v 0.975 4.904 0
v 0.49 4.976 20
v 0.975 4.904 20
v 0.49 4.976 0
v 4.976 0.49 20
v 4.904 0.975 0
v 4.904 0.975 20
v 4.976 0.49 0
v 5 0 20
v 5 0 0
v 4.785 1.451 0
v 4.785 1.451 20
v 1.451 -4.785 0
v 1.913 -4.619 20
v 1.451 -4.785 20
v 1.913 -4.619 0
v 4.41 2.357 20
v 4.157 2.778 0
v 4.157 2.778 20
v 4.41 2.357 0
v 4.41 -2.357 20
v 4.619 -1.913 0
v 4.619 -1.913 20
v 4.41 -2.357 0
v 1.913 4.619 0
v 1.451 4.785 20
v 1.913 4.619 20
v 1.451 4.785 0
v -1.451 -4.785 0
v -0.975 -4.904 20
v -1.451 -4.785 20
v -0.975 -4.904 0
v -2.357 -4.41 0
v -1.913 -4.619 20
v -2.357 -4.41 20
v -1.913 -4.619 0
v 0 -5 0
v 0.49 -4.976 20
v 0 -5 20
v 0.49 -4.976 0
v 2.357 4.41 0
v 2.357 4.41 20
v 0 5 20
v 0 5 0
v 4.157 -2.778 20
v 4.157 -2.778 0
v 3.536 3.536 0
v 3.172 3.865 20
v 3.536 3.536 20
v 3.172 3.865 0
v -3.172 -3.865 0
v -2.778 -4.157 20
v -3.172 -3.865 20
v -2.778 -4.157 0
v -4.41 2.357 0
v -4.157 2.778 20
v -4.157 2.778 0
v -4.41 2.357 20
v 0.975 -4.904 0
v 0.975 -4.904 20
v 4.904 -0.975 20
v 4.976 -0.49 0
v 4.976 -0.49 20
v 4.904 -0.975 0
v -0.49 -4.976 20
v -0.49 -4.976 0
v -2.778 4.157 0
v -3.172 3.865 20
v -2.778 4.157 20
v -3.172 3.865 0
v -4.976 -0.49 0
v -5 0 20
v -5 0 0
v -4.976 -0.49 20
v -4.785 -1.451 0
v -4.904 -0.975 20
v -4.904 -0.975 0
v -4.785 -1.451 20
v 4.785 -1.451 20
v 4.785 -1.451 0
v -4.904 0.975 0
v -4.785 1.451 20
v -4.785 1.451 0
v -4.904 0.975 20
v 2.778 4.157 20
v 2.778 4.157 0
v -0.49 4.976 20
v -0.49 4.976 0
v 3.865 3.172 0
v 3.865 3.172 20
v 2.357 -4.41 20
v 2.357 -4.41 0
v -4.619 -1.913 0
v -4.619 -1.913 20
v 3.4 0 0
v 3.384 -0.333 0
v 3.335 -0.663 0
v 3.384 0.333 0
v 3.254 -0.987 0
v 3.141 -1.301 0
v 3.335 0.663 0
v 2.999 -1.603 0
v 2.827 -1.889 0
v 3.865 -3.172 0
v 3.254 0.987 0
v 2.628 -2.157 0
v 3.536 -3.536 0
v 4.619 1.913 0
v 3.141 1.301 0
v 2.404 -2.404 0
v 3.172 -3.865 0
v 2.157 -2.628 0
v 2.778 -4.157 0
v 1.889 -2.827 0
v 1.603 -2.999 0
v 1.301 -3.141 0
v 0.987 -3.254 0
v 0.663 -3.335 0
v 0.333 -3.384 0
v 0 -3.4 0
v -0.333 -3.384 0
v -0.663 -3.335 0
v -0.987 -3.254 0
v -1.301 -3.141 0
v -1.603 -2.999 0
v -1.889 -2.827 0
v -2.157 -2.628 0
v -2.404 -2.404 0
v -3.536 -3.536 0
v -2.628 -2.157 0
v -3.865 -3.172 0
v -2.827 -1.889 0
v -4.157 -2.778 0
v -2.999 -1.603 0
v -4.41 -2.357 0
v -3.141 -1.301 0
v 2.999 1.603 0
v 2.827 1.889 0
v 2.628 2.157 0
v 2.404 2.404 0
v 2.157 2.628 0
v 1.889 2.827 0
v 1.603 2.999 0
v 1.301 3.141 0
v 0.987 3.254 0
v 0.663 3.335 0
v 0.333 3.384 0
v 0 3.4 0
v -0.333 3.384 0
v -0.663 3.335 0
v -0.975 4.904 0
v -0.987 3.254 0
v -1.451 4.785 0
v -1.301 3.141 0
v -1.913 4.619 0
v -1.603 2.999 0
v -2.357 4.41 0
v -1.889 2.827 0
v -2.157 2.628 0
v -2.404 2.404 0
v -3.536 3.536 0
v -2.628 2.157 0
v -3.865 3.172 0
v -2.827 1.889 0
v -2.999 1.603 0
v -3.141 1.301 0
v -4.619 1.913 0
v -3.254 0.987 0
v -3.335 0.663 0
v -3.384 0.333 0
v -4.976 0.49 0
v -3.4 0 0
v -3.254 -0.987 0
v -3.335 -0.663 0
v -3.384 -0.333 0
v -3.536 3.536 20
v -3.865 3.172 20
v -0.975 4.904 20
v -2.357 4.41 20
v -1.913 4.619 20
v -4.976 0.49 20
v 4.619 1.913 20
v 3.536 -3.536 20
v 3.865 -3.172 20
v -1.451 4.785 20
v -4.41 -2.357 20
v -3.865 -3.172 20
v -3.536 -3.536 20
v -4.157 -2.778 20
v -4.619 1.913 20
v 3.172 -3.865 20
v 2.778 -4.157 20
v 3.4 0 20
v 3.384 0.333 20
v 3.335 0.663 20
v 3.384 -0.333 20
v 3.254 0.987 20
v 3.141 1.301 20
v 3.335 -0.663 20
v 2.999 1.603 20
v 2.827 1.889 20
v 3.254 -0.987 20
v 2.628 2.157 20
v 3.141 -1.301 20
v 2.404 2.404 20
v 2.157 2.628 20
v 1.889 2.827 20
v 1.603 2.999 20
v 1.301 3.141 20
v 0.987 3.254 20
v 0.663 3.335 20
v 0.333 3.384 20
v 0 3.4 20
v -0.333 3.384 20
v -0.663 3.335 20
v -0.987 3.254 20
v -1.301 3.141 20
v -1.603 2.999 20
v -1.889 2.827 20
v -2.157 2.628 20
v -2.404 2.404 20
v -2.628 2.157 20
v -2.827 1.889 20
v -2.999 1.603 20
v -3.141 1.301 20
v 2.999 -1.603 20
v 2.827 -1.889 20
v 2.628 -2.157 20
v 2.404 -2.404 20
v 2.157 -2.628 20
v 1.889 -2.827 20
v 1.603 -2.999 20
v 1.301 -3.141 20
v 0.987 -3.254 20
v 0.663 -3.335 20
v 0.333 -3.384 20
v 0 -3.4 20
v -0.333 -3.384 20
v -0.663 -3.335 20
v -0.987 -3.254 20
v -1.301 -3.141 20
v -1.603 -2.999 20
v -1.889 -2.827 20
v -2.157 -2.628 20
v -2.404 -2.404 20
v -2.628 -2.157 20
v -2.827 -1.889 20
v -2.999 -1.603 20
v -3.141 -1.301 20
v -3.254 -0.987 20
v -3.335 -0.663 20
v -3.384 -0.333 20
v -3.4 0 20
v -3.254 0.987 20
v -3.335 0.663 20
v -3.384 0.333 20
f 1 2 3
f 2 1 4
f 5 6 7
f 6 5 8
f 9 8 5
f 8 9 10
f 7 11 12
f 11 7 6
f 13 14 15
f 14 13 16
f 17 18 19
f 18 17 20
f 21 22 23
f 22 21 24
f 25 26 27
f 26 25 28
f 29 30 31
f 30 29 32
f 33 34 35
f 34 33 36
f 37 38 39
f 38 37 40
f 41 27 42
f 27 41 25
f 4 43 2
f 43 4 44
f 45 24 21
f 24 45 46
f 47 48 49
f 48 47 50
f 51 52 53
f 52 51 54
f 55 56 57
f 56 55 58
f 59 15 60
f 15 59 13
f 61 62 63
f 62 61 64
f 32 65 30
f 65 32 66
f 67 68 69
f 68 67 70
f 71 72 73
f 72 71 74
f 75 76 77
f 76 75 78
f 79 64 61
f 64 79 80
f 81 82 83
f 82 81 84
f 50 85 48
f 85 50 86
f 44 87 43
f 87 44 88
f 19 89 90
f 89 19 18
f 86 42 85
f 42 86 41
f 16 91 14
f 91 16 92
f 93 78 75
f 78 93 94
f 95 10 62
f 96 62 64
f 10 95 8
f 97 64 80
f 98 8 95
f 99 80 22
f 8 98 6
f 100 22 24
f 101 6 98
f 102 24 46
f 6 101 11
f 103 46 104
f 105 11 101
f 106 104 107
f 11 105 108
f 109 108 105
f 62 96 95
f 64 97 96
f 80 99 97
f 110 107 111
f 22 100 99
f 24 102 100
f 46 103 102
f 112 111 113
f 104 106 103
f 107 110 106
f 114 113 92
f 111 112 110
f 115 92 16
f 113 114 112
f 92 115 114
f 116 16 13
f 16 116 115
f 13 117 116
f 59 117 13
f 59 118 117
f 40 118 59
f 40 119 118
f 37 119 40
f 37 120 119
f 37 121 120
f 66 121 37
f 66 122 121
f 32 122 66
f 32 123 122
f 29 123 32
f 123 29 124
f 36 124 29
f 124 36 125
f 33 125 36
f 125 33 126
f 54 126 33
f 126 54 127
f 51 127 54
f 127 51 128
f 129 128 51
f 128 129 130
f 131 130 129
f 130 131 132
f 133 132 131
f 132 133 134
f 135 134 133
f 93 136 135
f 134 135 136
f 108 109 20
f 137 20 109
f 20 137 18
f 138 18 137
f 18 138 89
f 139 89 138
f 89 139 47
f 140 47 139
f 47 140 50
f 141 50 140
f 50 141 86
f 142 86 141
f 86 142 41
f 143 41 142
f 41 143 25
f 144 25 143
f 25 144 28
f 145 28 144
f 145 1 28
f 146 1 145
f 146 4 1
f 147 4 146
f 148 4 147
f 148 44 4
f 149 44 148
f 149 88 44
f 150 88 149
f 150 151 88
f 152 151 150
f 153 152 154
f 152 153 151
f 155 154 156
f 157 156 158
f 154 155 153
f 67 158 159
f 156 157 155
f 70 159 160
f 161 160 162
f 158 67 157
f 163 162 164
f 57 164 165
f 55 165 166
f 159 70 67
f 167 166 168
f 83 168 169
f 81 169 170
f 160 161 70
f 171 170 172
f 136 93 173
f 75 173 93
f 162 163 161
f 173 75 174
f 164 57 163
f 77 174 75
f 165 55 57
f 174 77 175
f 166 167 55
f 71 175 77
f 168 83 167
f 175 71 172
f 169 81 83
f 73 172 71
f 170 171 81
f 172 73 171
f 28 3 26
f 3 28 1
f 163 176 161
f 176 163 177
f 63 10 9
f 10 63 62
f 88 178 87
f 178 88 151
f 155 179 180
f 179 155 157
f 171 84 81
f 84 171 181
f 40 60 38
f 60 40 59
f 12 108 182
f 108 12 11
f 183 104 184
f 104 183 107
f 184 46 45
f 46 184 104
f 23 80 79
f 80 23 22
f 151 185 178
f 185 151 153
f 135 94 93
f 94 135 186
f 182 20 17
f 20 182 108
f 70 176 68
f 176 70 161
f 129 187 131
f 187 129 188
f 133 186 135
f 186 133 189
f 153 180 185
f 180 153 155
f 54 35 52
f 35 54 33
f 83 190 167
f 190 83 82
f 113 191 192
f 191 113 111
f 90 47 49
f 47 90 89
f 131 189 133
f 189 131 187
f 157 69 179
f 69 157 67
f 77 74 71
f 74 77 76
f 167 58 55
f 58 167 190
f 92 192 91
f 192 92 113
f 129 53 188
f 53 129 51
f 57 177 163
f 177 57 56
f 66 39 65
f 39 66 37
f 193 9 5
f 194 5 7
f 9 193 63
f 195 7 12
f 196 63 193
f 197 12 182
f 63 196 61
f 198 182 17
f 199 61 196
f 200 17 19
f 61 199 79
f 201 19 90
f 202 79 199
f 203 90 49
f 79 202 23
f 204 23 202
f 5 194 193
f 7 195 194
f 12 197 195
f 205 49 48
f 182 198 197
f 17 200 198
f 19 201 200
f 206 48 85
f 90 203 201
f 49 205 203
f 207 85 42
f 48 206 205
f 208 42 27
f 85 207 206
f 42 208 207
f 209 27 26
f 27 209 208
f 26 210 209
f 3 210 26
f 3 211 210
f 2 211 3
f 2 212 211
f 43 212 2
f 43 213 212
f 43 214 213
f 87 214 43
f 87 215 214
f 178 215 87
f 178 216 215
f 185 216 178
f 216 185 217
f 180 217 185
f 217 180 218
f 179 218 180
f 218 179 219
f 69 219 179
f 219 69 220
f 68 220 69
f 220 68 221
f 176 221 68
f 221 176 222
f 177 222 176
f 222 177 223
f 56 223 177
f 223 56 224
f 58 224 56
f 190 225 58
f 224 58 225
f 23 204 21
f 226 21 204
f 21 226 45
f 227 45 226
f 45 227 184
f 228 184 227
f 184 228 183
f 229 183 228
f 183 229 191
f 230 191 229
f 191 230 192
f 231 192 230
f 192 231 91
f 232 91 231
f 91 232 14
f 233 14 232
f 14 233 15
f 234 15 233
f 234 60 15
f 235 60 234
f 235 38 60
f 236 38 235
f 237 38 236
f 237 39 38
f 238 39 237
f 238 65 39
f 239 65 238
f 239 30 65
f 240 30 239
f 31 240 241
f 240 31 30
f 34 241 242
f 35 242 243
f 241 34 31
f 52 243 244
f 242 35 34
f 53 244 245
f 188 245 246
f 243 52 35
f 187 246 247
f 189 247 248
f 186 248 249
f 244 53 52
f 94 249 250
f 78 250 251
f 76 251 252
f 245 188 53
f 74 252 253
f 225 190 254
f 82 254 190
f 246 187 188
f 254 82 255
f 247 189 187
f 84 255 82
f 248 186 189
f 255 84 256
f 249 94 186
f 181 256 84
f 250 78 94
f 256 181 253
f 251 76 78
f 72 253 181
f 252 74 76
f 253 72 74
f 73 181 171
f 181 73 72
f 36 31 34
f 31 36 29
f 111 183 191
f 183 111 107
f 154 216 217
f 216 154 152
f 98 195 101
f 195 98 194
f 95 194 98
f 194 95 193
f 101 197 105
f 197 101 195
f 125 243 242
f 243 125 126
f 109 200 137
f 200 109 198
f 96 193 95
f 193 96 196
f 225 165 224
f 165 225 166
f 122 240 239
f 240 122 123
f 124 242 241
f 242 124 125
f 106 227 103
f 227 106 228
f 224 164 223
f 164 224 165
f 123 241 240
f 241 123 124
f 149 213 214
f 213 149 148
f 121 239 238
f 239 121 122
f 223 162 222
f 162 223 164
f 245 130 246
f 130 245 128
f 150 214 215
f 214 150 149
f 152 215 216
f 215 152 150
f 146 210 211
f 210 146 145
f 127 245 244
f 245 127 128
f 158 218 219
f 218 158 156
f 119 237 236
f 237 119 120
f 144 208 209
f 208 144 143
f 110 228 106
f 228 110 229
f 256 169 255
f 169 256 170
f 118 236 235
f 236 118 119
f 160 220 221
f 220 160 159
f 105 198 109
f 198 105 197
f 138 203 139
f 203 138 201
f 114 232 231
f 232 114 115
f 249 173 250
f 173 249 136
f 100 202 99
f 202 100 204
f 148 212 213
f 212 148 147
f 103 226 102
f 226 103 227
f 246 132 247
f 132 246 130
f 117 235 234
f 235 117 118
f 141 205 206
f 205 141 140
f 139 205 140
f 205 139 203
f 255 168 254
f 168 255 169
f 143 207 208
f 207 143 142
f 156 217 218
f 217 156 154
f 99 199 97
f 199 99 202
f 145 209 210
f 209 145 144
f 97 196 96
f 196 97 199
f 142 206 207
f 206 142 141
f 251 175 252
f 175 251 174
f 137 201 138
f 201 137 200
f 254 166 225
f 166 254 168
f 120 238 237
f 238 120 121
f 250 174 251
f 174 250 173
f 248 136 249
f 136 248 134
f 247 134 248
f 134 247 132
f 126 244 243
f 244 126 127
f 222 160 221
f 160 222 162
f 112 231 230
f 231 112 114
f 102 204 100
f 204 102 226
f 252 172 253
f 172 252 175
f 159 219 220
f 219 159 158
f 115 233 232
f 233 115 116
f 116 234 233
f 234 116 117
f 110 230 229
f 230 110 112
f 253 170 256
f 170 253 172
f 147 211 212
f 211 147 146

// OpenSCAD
// Funnel - printed upright, wide opening at top, open bottom and spout through
// Units: mm. Teaches a cone + spout with uniform wall thickness.
//

spout_d     = 10;   // spout outer diameter
spout_bore  = 6.8;  // spout bore (10 - 2*1.6)
spout_h     = 20;   // spout height (z = 0 to 20)
cone_top_d  = 60;   // cone rim outer diameter (z = 50)
cone_h      = 30;   // cone height (z = 20 to 50)
wall        = 1.6;  // wall thickness everywhere
eps         = 0.5;  // cutter overshoot

$fn = 64;

// Cone inner diameter at its start (z = 20), bore open through
cone_in_d = spout_d - 2*wall;   // 6.8 mm, matches bore

difference() {
    union() {
        // Spout: cylinder z = 0..20
        cylinder(d = spout_d, h = spout_h);
        // Cone: linear_extrude from a 6.8 mm disk at z = 20 up to 60 mm at z = 50
        translate([0, 0, spout_h])
            linear_extrude(height = cone_h)
                cylinder(d = cone_top_d, h = cone_h + 0.01); // tiny overlap for clean union
    }
    // Through-bore: one cylinder from z = 0 to z = 50.01
    translate([0, 0, -eps])
        cylinder(d = spout_bore, h = spout_h + cone_h + 2*eps);
}
